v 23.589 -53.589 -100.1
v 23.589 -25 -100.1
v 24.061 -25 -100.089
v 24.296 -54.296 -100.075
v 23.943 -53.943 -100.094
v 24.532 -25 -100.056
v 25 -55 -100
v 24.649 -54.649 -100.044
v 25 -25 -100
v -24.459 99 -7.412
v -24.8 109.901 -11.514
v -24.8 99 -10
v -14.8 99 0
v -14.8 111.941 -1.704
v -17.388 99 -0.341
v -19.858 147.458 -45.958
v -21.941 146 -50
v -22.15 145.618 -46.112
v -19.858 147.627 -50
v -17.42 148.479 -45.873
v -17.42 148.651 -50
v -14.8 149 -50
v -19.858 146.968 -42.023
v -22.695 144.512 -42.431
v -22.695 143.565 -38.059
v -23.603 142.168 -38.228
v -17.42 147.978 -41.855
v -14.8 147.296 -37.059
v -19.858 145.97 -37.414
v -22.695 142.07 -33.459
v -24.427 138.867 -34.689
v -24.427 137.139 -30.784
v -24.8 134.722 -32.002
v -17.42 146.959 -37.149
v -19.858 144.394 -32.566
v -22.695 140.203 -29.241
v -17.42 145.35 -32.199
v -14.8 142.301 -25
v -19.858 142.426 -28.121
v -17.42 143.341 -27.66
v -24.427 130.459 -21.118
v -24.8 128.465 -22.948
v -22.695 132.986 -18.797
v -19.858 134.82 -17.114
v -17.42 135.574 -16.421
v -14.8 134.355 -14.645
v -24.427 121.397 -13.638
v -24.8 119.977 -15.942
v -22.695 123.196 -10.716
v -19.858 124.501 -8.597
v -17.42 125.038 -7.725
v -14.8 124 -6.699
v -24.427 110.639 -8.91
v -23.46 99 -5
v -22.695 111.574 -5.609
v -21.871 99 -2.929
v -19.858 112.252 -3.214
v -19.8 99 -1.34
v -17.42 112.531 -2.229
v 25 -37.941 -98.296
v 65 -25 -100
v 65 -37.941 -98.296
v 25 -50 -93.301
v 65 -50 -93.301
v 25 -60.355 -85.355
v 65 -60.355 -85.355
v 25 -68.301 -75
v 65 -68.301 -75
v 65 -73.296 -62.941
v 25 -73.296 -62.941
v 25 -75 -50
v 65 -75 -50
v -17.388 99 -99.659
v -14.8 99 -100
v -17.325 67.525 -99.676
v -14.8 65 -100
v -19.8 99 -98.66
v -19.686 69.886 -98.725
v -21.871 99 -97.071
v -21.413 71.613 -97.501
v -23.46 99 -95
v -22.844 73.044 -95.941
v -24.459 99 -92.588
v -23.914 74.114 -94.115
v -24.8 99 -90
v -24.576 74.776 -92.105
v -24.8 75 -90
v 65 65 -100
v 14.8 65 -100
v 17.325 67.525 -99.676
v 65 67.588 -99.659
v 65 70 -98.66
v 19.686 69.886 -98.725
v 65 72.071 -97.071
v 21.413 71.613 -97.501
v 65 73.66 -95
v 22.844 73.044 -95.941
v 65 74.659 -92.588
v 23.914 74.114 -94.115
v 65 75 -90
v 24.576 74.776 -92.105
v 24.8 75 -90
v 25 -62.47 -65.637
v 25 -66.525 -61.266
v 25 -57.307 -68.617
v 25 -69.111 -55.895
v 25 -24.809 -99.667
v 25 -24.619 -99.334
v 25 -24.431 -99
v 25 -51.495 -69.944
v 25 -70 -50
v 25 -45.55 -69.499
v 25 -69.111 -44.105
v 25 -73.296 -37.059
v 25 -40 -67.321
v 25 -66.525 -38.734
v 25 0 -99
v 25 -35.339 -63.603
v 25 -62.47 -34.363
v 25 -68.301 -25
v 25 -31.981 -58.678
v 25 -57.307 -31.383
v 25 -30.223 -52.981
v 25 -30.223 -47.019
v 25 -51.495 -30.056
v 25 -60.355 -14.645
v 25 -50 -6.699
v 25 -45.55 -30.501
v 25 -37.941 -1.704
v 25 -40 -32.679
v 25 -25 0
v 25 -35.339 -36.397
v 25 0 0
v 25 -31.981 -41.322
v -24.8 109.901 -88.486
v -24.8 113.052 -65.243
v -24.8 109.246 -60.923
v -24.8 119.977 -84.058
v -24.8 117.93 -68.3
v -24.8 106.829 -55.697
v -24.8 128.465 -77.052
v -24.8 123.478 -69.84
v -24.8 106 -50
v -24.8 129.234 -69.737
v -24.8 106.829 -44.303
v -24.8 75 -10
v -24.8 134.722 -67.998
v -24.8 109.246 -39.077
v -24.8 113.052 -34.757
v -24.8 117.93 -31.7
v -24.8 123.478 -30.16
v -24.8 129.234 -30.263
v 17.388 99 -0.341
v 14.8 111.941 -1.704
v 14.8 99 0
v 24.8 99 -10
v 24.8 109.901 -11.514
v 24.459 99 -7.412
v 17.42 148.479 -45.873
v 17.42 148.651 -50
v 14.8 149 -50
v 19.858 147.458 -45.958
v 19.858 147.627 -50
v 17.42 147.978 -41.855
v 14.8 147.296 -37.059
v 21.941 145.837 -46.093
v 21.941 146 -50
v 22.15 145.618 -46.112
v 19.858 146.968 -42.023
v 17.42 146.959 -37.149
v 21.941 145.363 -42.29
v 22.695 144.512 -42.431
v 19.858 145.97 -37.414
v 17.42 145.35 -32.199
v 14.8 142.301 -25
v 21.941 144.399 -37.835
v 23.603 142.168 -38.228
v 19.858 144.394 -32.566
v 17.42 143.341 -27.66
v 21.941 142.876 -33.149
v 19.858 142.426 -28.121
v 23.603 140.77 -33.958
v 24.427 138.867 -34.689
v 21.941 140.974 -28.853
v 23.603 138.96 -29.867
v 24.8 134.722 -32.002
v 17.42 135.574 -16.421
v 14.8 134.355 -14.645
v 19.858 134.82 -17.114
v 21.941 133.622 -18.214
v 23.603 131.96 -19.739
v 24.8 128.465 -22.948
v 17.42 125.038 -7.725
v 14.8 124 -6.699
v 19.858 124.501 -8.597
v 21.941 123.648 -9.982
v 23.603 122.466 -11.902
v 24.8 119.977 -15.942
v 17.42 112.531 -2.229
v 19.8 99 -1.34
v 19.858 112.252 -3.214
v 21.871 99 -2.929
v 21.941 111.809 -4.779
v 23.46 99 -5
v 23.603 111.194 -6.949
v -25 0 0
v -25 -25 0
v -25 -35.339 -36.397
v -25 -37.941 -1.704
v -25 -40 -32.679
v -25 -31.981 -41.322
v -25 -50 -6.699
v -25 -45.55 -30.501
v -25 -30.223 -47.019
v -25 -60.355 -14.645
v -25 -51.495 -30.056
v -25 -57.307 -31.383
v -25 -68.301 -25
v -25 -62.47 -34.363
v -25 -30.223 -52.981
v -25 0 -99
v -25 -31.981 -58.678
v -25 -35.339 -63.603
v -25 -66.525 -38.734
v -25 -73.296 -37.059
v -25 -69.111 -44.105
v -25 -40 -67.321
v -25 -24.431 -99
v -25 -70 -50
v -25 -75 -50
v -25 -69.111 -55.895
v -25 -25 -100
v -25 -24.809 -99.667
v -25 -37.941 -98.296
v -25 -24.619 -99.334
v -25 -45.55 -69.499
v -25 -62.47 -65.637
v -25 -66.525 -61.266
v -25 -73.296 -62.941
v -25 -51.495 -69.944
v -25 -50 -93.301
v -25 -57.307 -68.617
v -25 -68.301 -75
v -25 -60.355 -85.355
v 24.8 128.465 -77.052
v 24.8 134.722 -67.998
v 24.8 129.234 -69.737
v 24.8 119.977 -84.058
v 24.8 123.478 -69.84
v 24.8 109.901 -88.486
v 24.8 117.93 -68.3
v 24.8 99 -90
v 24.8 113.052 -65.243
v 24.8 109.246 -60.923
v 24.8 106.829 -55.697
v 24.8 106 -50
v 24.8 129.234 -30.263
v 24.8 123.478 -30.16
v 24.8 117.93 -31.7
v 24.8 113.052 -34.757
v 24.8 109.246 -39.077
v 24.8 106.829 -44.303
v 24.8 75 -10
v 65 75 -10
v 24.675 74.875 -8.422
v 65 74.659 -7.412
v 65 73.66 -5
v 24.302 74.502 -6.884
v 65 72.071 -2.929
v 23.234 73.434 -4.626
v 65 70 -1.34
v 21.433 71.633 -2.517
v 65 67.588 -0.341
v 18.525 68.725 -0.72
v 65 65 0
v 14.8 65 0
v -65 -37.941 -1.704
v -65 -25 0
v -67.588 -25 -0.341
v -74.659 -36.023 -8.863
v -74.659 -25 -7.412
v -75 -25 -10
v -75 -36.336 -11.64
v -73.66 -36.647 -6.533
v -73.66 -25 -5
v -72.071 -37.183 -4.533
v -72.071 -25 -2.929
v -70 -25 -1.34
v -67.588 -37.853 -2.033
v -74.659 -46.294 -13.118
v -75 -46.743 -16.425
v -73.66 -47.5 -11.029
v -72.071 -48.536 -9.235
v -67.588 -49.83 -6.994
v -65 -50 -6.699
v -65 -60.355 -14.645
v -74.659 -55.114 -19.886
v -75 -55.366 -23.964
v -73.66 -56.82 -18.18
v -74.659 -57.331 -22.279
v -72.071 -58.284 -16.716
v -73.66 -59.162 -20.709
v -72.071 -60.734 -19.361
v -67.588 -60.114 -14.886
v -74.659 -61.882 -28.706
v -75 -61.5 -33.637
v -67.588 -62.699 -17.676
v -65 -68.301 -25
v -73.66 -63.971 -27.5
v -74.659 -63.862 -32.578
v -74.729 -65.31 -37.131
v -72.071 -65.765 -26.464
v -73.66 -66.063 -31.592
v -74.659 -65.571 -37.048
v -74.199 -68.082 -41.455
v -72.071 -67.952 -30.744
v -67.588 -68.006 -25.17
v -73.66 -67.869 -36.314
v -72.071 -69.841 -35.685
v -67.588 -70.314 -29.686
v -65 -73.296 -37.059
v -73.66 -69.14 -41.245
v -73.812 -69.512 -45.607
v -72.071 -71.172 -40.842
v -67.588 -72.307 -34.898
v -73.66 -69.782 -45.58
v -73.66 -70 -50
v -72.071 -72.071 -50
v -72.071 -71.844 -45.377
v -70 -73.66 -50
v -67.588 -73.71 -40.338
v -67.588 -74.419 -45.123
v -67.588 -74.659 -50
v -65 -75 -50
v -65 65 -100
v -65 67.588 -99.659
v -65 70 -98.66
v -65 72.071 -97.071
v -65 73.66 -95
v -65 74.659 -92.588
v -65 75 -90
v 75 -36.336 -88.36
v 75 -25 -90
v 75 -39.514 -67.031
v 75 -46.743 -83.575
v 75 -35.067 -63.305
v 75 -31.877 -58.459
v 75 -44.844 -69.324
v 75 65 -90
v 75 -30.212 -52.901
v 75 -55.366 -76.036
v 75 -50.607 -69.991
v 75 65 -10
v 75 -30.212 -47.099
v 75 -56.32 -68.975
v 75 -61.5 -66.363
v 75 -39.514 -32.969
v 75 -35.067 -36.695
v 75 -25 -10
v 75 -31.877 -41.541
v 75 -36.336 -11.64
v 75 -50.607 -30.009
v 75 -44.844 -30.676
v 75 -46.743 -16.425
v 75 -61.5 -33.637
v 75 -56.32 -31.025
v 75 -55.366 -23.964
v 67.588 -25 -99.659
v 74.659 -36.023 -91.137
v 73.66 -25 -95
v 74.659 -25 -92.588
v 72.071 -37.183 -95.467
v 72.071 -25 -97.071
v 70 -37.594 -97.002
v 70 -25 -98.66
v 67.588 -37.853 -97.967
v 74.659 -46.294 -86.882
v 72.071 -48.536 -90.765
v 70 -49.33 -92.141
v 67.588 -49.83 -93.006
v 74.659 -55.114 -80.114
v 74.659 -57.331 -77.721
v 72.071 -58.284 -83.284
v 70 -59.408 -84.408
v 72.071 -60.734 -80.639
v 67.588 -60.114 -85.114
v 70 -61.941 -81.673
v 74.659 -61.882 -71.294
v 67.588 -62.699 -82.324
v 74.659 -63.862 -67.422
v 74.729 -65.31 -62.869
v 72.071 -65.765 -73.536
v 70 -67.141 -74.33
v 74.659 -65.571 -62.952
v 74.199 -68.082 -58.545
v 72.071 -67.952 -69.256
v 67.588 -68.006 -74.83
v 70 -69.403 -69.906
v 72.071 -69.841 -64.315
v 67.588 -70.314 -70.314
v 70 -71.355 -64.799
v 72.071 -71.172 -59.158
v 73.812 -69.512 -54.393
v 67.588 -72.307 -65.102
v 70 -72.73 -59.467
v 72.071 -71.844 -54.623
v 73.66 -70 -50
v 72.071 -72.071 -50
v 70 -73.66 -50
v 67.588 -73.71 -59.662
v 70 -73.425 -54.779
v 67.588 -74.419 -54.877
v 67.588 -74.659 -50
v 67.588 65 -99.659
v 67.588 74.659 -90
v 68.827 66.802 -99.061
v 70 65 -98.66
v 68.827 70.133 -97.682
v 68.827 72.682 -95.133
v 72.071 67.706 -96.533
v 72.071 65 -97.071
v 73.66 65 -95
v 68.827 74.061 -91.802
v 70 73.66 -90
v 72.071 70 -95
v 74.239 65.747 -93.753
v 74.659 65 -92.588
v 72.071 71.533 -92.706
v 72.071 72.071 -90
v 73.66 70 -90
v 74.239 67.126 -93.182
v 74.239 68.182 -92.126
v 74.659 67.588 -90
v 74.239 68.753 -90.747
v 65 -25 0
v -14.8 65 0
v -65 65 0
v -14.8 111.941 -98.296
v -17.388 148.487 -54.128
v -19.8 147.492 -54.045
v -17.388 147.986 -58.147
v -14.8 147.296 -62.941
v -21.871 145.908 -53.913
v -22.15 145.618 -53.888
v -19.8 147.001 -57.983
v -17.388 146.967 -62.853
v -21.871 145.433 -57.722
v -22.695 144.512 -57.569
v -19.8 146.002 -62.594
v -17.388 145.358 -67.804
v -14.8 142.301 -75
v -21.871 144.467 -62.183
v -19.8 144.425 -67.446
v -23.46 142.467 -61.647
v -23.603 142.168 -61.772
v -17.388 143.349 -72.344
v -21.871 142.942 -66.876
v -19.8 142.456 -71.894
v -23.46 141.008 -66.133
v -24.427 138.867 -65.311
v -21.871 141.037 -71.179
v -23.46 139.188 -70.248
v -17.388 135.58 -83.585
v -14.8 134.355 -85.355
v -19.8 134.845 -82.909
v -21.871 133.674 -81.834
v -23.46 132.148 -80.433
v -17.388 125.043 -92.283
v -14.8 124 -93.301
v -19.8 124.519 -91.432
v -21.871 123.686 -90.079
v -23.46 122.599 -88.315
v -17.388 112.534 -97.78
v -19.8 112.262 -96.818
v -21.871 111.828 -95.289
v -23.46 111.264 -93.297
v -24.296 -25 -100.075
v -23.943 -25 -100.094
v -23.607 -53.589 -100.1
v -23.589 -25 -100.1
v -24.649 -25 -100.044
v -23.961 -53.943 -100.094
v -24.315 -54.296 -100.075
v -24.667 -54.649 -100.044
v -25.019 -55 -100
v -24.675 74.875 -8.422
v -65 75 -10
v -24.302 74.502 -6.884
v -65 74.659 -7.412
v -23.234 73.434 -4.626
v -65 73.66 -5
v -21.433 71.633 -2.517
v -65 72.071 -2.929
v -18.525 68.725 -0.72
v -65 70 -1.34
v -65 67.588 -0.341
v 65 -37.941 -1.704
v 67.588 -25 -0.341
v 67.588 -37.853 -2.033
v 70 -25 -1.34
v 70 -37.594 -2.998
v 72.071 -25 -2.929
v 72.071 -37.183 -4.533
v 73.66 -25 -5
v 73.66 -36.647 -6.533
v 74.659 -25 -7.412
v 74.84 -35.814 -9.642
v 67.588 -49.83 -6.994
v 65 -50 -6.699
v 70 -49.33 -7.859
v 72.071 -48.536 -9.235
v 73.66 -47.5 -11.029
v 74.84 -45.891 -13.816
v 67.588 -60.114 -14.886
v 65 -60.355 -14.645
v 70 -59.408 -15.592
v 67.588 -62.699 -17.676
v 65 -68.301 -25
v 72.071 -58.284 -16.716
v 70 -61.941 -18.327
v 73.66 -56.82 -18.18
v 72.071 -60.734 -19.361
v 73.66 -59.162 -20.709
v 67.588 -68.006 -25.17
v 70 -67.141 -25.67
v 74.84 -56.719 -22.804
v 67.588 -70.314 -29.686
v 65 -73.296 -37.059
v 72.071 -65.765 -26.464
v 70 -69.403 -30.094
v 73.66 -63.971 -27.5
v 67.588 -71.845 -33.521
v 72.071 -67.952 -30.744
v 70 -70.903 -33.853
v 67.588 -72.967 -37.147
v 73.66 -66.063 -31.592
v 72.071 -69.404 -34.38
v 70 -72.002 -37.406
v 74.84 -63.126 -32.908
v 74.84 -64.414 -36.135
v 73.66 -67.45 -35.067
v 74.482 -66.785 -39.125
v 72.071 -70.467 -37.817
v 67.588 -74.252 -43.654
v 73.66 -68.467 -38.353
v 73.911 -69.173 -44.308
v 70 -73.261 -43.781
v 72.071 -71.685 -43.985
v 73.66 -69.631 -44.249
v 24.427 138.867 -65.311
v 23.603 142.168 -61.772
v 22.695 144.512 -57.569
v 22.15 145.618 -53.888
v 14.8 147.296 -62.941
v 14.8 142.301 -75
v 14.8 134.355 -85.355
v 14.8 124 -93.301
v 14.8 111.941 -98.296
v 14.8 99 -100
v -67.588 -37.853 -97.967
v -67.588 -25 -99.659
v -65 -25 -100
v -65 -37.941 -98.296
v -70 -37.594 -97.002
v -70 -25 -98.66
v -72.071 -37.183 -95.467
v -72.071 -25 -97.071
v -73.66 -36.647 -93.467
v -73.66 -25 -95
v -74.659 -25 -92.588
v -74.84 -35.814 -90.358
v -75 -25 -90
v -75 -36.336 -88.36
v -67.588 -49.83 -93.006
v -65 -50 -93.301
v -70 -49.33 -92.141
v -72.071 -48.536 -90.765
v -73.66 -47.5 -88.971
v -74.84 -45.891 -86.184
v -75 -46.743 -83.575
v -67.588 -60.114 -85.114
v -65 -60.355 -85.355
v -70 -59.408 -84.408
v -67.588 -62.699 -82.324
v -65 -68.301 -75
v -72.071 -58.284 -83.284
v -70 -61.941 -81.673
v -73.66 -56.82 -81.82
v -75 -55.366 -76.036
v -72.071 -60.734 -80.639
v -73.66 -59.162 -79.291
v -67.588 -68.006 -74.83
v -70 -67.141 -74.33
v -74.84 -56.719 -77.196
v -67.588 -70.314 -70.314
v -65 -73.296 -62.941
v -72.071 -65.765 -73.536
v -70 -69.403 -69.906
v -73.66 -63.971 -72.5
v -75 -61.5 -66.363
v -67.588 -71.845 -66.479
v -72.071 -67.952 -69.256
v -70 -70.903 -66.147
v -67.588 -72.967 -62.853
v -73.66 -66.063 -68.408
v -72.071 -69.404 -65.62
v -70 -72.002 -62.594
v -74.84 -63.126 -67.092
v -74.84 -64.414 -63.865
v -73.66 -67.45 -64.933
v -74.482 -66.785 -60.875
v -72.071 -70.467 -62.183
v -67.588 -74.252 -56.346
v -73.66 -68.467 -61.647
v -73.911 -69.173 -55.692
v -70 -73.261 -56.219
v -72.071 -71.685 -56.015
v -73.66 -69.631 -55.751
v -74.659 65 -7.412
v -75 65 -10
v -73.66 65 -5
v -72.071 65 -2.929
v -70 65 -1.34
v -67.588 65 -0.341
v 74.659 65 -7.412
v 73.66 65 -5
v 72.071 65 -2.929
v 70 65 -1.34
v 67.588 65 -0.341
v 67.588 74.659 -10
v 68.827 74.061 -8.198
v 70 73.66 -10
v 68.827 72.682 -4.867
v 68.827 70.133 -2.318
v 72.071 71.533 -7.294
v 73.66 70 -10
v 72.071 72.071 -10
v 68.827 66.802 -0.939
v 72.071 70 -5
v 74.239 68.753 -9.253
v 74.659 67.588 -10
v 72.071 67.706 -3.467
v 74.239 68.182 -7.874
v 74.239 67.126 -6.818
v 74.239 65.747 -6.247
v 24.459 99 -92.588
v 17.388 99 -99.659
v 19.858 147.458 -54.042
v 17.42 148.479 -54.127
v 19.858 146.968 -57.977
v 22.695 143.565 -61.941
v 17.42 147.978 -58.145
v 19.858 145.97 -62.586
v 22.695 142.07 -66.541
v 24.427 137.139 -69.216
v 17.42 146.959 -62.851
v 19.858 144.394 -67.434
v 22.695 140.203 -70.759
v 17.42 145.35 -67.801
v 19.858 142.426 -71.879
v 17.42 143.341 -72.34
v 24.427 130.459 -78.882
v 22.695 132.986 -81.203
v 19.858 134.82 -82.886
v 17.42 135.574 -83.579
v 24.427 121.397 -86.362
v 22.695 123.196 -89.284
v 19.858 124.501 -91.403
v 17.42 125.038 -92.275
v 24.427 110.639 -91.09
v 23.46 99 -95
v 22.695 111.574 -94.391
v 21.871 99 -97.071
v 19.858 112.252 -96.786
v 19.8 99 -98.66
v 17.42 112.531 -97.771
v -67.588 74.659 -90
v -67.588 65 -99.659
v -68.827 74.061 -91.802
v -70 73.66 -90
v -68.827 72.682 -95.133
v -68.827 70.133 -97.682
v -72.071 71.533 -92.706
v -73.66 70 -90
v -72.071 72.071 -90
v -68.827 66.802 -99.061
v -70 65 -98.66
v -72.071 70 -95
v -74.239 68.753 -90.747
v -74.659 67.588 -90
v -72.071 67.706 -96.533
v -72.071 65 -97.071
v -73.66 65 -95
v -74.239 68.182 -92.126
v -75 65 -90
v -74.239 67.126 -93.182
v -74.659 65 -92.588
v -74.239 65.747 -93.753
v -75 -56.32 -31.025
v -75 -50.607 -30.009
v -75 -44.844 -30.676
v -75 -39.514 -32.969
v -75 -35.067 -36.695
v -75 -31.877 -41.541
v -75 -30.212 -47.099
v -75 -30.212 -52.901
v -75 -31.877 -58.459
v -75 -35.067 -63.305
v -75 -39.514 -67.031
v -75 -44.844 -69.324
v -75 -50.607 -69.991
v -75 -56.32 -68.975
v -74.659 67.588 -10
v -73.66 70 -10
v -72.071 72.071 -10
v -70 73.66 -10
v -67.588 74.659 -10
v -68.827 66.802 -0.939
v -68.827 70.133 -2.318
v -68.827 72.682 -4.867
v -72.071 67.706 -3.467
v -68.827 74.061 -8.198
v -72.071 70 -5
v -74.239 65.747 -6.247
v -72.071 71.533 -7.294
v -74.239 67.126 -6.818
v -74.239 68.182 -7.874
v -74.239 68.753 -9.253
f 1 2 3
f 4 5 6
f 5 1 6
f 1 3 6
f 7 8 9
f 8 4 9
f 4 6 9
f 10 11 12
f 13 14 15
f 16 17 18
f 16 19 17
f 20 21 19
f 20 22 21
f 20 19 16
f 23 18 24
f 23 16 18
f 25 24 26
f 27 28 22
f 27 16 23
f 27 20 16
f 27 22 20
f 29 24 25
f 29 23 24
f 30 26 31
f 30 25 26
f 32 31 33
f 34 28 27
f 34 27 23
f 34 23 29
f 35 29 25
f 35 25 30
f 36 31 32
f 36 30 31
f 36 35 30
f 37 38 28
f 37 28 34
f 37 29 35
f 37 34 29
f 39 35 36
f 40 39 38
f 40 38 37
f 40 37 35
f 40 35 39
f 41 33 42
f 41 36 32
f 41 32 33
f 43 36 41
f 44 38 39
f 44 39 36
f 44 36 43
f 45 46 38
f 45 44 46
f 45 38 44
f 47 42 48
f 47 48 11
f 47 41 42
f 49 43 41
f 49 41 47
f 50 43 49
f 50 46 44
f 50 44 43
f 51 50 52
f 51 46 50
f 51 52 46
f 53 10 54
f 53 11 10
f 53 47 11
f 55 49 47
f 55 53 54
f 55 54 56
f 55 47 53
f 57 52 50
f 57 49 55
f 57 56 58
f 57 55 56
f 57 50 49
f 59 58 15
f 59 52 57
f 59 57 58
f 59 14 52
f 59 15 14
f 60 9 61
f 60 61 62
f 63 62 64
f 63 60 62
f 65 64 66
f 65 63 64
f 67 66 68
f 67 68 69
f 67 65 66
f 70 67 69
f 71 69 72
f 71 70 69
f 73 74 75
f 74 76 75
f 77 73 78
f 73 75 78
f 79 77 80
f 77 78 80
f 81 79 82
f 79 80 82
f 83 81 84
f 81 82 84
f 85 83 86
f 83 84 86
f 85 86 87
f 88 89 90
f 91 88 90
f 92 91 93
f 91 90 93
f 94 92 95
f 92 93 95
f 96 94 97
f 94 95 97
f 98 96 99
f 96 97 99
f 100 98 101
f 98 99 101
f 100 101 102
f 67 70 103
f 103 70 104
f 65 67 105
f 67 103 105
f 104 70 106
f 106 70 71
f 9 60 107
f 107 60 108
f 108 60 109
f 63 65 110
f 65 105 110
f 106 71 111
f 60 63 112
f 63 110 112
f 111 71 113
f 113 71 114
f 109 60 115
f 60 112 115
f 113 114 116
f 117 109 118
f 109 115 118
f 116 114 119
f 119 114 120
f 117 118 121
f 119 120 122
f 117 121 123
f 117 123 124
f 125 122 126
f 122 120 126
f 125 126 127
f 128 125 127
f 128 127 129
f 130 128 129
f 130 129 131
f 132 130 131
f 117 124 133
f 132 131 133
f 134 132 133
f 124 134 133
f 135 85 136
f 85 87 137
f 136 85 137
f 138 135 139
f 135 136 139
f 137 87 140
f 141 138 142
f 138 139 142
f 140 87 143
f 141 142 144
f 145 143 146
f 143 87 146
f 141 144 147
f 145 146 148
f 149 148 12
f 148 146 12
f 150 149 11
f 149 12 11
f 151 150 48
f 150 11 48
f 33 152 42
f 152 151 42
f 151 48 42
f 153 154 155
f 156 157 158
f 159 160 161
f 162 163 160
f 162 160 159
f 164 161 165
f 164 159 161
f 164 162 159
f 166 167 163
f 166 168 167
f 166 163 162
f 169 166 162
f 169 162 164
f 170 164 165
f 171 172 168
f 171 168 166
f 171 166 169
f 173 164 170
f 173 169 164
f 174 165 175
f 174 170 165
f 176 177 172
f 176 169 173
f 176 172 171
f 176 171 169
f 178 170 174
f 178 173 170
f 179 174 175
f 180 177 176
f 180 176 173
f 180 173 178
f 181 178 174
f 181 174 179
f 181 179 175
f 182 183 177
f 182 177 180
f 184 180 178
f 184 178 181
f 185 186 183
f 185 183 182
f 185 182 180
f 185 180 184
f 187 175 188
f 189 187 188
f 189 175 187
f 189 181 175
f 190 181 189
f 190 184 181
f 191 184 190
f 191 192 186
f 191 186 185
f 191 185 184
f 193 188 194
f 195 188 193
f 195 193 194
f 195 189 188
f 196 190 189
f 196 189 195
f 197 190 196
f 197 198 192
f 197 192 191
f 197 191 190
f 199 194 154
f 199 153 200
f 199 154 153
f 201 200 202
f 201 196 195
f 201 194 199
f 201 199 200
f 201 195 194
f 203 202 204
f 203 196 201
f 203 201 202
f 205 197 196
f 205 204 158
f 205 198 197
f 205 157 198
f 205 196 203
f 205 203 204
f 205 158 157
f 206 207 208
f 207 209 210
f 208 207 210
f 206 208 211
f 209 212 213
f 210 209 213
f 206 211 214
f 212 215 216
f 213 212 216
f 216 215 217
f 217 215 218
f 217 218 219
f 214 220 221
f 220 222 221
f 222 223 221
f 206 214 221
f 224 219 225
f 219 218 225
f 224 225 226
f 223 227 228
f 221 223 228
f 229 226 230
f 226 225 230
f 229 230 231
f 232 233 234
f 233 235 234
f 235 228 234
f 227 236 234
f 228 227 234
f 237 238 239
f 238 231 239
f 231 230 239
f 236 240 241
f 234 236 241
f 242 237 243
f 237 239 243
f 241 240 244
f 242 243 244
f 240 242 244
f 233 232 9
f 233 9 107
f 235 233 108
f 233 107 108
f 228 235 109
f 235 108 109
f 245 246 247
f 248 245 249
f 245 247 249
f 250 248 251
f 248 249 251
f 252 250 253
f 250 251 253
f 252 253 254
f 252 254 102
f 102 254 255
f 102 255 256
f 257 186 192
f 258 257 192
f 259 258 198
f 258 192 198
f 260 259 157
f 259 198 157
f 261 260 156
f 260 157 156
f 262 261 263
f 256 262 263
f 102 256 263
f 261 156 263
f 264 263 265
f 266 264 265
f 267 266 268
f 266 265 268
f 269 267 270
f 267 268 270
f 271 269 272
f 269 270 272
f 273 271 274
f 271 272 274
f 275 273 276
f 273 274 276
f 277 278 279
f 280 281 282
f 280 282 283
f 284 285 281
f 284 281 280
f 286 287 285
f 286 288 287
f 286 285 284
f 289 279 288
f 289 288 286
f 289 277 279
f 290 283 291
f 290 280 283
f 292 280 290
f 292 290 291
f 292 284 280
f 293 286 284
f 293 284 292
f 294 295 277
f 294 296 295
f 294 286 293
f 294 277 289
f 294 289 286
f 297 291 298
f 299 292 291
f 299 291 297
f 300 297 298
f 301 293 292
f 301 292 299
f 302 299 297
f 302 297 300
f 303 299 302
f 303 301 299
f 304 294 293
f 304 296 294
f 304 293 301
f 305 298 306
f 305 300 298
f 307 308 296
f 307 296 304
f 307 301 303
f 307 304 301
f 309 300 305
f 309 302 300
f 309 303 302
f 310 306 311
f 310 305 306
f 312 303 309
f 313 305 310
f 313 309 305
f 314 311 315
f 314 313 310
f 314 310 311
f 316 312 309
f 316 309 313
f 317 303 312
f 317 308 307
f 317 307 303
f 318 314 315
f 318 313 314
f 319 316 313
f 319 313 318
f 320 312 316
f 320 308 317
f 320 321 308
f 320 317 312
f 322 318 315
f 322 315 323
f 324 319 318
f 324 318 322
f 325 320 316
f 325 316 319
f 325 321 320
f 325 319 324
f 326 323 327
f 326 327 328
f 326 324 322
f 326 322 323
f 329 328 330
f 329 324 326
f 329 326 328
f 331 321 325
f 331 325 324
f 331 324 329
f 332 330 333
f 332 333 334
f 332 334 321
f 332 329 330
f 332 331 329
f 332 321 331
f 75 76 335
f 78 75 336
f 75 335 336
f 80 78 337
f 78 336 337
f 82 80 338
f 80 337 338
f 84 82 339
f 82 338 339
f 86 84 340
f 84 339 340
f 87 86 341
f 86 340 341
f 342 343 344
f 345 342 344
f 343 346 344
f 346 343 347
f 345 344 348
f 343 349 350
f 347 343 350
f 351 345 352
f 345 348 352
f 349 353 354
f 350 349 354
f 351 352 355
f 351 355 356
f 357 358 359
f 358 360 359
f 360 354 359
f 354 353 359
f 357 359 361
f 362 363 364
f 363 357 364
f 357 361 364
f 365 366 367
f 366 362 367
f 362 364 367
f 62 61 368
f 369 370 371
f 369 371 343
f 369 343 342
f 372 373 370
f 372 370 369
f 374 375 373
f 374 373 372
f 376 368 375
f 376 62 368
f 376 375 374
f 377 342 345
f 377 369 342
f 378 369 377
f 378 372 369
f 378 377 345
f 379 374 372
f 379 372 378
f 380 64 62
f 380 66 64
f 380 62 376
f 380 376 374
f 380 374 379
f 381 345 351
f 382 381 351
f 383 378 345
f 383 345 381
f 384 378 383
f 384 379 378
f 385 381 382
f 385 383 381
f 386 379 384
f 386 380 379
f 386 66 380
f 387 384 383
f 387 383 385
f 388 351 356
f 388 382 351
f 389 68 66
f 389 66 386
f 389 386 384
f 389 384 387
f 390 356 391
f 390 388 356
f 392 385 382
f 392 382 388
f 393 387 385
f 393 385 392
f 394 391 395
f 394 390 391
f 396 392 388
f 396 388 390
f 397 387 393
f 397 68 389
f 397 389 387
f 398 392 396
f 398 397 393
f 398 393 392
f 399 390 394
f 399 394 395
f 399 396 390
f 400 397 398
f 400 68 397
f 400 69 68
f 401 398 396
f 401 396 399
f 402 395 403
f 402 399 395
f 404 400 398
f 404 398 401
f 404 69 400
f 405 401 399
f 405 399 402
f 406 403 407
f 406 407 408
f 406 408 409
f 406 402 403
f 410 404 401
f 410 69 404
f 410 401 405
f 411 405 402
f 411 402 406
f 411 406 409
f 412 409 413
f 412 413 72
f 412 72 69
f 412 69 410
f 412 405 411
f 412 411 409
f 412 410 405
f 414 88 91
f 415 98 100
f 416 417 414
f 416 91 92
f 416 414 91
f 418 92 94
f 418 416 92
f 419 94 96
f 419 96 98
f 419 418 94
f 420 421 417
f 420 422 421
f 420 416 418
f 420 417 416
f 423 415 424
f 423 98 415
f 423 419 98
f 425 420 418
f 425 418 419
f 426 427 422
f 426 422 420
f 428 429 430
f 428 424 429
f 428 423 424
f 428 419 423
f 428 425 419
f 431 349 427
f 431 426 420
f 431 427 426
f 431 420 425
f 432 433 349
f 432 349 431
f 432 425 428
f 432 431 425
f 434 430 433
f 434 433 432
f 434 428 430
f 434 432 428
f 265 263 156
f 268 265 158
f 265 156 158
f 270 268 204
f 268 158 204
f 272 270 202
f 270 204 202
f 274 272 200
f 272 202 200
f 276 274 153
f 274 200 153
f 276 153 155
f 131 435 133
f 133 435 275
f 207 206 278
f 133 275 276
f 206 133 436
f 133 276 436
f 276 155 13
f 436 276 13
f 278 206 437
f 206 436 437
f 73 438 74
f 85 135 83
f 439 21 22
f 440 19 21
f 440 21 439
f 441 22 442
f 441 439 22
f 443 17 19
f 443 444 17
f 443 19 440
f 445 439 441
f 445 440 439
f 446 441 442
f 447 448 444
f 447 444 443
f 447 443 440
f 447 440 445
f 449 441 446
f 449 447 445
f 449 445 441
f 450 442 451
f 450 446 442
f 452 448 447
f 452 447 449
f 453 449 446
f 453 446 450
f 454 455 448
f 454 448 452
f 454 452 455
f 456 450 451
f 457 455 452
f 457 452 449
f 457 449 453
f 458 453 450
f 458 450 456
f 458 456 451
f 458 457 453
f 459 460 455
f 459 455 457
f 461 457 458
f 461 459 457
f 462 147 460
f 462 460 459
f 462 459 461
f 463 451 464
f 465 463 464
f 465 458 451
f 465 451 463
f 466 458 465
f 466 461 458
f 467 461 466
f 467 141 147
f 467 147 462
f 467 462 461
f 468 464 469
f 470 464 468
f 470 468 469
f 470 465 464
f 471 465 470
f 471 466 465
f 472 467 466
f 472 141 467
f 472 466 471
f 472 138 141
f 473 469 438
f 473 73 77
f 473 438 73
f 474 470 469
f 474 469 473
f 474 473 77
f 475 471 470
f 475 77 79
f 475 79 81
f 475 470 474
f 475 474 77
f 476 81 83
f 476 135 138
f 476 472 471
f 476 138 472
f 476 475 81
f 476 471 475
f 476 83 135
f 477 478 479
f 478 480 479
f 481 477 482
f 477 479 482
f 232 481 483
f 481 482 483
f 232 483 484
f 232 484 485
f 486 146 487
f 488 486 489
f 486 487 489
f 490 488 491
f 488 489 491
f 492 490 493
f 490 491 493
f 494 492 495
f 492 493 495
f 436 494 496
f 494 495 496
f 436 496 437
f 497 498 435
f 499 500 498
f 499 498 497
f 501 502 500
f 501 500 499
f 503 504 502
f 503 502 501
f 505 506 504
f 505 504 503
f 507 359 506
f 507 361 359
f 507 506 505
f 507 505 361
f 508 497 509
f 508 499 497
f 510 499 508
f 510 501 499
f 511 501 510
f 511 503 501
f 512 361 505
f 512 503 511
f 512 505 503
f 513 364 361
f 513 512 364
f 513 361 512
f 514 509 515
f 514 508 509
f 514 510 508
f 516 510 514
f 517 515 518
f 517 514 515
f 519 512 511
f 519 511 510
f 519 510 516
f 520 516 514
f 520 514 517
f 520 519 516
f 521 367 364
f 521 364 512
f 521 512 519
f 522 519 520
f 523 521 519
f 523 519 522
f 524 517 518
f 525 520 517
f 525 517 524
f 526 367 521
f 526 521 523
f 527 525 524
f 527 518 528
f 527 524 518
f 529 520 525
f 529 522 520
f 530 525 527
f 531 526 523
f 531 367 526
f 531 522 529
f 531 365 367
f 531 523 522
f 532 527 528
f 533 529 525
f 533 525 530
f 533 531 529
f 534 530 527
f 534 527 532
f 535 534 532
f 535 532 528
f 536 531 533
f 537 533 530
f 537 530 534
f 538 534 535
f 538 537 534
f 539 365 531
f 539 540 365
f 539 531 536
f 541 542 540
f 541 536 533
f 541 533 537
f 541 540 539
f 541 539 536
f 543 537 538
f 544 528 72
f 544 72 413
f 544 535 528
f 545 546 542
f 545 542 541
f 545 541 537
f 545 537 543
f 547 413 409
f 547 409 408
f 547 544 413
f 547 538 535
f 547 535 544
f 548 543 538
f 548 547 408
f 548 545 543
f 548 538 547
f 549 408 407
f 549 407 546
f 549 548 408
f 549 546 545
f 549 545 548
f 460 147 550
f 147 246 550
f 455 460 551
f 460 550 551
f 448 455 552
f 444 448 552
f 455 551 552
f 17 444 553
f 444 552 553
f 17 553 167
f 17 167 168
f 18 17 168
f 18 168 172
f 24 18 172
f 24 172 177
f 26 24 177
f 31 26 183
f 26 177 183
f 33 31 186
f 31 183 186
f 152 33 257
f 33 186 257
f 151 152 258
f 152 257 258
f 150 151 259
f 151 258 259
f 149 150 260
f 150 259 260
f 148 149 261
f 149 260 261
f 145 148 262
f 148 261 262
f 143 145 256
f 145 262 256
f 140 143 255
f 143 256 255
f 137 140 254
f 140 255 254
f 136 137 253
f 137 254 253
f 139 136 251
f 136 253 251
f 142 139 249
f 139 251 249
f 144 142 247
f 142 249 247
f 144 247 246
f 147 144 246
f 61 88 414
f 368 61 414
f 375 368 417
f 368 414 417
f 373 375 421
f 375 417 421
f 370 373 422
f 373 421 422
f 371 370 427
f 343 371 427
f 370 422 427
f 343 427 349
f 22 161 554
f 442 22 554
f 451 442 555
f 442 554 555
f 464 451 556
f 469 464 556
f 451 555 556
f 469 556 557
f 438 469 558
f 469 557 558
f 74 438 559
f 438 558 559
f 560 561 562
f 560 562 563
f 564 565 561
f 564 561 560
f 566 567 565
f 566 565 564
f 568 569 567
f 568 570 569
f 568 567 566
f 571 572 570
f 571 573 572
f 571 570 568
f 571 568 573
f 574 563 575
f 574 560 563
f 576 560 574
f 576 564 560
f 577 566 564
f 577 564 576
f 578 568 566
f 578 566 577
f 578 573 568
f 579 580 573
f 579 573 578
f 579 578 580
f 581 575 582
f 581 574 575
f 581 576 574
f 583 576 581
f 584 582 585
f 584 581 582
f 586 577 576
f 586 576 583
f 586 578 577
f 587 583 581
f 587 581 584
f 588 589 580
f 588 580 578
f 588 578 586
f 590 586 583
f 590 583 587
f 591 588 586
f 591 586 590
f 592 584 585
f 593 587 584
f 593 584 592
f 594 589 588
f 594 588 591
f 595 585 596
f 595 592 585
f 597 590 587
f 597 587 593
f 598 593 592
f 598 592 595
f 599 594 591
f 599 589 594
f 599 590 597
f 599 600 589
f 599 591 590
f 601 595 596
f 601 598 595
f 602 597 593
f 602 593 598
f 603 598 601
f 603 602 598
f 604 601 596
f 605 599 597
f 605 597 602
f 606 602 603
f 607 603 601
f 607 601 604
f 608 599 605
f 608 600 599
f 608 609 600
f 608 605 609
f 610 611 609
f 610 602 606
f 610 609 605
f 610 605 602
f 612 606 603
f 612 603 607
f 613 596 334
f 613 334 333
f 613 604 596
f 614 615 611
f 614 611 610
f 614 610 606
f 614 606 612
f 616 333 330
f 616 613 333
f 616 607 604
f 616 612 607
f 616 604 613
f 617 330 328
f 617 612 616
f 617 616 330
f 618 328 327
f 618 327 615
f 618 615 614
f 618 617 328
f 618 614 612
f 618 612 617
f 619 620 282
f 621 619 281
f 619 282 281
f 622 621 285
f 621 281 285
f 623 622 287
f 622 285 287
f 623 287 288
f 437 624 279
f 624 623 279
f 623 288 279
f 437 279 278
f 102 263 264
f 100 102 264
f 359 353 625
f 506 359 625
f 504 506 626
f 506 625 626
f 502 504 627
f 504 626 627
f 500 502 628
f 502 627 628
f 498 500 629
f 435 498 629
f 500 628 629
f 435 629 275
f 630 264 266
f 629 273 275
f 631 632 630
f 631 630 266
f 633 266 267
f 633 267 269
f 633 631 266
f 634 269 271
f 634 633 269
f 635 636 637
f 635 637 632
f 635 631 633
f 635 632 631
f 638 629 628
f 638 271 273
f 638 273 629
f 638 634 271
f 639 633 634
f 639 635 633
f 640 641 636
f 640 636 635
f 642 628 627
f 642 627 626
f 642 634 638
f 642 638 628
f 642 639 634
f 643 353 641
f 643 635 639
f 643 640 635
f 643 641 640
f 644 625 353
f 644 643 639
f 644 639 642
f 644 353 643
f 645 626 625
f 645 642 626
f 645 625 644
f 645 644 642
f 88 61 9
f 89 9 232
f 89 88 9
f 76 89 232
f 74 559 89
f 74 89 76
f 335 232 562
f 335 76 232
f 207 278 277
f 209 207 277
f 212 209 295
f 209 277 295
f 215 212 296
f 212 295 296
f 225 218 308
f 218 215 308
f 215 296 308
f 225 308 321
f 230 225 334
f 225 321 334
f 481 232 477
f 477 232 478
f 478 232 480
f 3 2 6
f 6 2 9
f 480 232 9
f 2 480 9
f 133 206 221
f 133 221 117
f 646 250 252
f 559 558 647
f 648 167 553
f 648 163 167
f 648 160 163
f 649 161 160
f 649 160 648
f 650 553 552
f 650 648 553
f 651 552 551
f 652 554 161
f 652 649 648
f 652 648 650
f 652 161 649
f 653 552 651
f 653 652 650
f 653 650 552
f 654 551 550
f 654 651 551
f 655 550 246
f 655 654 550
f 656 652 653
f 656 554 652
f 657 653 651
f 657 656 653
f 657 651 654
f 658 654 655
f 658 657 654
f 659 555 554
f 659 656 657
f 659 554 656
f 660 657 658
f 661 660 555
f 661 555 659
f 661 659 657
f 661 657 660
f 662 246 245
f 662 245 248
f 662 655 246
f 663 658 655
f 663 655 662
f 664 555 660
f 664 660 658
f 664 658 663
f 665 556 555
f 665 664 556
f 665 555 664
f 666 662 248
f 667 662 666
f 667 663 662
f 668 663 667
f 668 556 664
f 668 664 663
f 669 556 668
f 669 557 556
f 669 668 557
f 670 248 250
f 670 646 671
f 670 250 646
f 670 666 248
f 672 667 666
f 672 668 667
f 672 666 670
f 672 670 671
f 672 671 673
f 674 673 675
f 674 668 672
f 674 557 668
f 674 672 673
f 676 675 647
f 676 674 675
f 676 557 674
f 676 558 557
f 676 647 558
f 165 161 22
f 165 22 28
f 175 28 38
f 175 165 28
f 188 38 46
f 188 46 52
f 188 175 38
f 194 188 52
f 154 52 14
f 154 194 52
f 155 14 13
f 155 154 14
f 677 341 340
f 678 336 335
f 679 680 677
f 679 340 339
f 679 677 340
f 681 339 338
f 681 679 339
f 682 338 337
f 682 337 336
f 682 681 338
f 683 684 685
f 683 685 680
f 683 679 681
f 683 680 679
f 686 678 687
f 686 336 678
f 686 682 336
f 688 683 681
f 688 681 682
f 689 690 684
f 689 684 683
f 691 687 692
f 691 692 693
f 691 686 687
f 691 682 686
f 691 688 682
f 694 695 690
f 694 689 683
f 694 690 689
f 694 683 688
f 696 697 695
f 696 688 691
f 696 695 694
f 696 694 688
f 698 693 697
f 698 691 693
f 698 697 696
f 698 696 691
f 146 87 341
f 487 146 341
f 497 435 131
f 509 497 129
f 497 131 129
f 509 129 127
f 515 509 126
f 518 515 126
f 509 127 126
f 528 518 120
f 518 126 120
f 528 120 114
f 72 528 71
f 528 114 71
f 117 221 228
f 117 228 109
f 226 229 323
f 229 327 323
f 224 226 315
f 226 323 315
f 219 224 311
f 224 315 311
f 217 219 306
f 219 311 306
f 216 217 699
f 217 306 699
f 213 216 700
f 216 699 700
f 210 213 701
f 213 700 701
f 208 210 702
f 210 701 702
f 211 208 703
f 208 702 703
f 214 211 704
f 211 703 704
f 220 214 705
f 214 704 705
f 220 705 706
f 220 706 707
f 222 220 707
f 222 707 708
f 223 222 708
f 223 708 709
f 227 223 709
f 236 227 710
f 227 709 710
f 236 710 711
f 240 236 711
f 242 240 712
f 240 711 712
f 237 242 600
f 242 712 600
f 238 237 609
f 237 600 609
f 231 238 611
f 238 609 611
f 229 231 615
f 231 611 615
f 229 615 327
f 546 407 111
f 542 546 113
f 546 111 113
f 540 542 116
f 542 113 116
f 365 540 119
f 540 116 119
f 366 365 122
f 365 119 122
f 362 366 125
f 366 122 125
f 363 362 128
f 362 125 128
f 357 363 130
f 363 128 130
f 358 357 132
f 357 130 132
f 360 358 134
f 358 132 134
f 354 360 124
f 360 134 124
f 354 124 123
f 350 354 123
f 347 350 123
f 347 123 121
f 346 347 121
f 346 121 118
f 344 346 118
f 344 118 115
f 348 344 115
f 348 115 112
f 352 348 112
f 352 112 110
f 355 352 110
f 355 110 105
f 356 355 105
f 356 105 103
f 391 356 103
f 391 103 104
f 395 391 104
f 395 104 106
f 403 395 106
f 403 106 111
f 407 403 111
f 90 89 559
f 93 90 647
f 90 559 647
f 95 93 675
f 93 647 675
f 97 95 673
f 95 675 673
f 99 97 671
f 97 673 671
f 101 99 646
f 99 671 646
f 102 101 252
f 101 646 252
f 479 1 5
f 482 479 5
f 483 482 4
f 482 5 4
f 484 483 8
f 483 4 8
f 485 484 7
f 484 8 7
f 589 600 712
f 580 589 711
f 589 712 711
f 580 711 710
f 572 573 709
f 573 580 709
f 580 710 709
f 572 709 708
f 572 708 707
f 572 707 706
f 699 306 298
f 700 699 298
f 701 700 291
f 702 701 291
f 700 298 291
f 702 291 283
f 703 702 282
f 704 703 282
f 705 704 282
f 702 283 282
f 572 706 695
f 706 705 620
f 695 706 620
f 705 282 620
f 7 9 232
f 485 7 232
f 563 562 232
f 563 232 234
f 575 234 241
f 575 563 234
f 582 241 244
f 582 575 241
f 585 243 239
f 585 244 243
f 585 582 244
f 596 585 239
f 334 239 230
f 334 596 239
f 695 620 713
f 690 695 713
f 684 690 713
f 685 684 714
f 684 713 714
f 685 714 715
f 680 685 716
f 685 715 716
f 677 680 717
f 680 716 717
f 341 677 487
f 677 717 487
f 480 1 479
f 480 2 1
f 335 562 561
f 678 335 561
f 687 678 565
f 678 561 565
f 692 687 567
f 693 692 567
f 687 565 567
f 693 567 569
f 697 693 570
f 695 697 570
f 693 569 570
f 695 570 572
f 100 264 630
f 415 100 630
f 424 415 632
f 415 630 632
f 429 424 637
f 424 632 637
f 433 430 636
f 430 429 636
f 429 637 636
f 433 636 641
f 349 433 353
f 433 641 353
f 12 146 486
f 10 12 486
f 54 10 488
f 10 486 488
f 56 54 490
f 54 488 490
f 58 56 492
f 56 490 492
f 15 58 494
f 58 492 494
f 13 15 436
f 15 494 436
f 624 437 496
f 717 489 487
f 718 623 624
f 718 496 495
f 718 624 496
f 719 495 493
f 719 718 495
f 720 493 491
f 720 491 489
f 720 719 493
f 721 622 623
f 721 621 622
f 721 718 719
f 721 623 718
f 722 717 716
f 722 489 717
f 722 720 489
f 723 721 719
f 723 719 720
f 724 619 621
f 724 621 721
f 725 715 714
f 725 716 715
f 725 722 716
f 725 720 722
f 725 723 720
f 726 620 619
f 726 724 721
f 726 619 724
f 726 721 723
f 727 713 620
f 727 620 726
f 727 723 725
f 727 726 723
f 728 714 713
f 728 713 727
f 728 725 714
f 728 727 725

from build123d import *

# Parameters (mm, degrees)
BOSS_EXTRUDE1_DEPTH    = 100
SKETCH2_W              = 50
SKETCH2_H              = 50
CUT_EXTRUDE1_DEPTH     = 195.489074243
FILLET1_R              = 50
CUT_EXTRUDE2_DEPTH     = 25
SKETCH7_R              = 20
CUT_EXTRUDE3_DEPTH     = 234.882449106
FILLET2_R              = 50
CUT_EXTRUDE6_START     = -75
CUT_EXTRUDE6_OUTLINE_W = 50
CUT_EXTRUDE6_OUTLINE_H = 6.698729811
CUT_EXTRUDE6_DEPTH     = 50
CUT_EXTRUDE7_DEPTH     = 25
FILLET3_R              = 10
SKETCH11_W             = 50
SKETCH11_H             = 25
CUT_EXTRUDE8_DEPTH     = 99
BOSS_EXTRUDE7_DEPTH    = 0.1
FILLET4_R              = 10
FILLET5_R              = 10
SKETCH14_R             = 20
CUT_EXTRUDE9_DEPTH     = 206.380257205


with BuildPart() as part:
    # Sketch1 → Boss-Extrude1 (new body)
    with BuildSketch(Plane.XY):
        Polygon((-24.8, 75), (-24.8, 149), (24.8, 149), (24.8, 75), (75, 75), (75, -75), (-75, -75), (-75, 75), align=None)
    extrude(amount=-BOSS_EXTRUDE1_DEPTH)

    # Sketch2 → Cut-Extrude1 (cut, through all)
    with BuildSketch(Plane.XY):
        with Locations((0, -75)):
            Rectangle(SKETCH2_W, SKETCH2_H)
    extrude(amount=-CUT_EXTRUDE1_DEPTH, mode=Mode.SUBTRACT)

    # Fillet1
    fillet1_edges = [part.edges().sort_by_distance(p)[0] for p in [
        (0, 149, -100),
        (0, 149, 0),
    ]]
    fillet(fillet1_edges, radius=FILLET1_R - 0.0001)  # a hair under: the kernel refuses the full size

    # Sketch6 → Cut-Extrude2 (cut, symmetric)
    with BuildSketch(Plane(origin=(0, 0, 0), x_dir=(0, 0, -1), z_dir=(1, 0, 0))):
        with BuildLine():
            Line((100, -50), (0, -50))
            ThreePointArc((0, -50), (50, 0), (100, -50))
        make_face()
    extrude(amount=CUT_EXTRUDE2_DEPTH, both=True, mode=Mode.SUBTRACT)

    # Sketch7 → Cut-Extrude3 (cut, through all)
    with BuildSketch(Plane.ZY.offset(75)):
        with Locations(Location((-50, -50, 0), (0, 0, 270))):
            Circle(SKETCH7_R)
    extrude(amount=-CUT_EXTRUDE3_DEPTH, mode=Mode.SUBTRACT)

    # Fillet2
    fillet2_edges = [part.edges().sort_by_distance(p)[0] for p in [
        (-50, -75, -100),
        (-50, -75, 0),
    ]]
    fillet(fillet2_edges, radius=FILLET2_R - 0.0001)  # a hair under: the kernel refuses the full size

    # Cut-Extrude6: read off the stored shape, not the designer's step
    # Cut-Extrude6 outline → Cut-Extrude6 (cut)
    with BuildSketch(Plane(origin=(0, 0, 0), x_dir=(1, 0, 0), z_dir=(0, 1, 0)).offset(CUT_EXTRUDE6_START)):
        with Locations((0, 96.650635095)):
            Rectangle(CUT_EXTRUDE6_OUTLINE_W, CUT_EXTRUDE6_OUTLINE_H)
        with Locations((0, 3.349364906)):
            Rectangle(CUT_EXTRUDE6_OUTLINE_W, CUT_EXTRUDE6_OUTLINE_H)
    extrude(amount=CUT_EXTRUDE6_DEPTH, mode=Mode.SUBTRACT)

    # Sketch10 → Cut-Extrude7 (cut, symmetric)
    with BuildSketch(Plane(origin=(0, 0, 0), x_dir=(0, 0, -1), z_dir=(1, 0, 0))):
        with BuildLine():
            Line((0, -25), (100, -25))
            ThreePointArc((100, -25), (50, -11.611517322), (0, -25))
        make_face()
    extrude(amount=CUT_EXTRUDE7_DEPTH, both=True, mode=Mode.SUBTRACT)

    # Fillet3
    # the kernel refuses this fillet: 10 mm, written as the material it takes off along each edge
    with BuildSketch(Plane(origin=(24.8, 99.0001, -100), x_dir=(0, 0, 1), z_dir=(0, -1, 0)), Plane(origin=(-24.8, 75, 0), x_dir=(1, 0, 0), z_dir=(0, 1, 0)), Plane(origin=(-24.8, 75, -100), x_dir=(0, 0, 1), z_dir=(0, 1, 0)), Plane(origin=(24.8, 99.0001, 0), x_dir=(-1, 0, 0), z_dir=(0, -1, 0))) as fillet3_piece_1:
        with BuildLine():
            CenterArc((FILLET3_R, FILLET3_R), FILLET3_R, 180, 90)
            Line((0, FILLET3_R), (0, 0))
            Line((0, 0), (FILLET3_R, 0))
        make_face()
    extrude(amount=24.0001, mode=Mode.SUBTRACT)
    with BuildSketch(Plane(origin=(24.8, 75, 0), x_dir=(0, -1, 0), z_dir=(1, 0, 0)), Plane(origin=(-100, 75, -100), x_dir=(0, 0, 1), z_dir=(1, 0, 0)), Plane(origin=(24.8, 75, -100), x_dir=(0, 0, 1), z_dir=(1, 0, 0)), Plane(origin=(-100, 75, 0), x_dir=(0, -1, 0), z_dir=(1, 0, 0))) as fillet3_piece_2:
        with BuildLine():
            CenterArc((FILLET3_R, FILLET3_R), FILLET3_R, 180, 90)
            Line((0, FILLET3_R), (0, 0))
            Line((0, 0), (FILLET3_R, 0))
        make_face()
    extrude(amount=75.2, mode=Mode.SUBTRACT)
    with BuildSketch(Plane(origin=(-75, -25.0001, -100), x_dir=(0, 0, 1), z_dir=(0, 1, 0)), Plane(origin=(75, 100, 0), x_dir=(-1, 0, 0), z_dir=(0, -1, 0)), Plane(origin=(75, 100, -100), x_dir=(0, 0, 1), z_dir=(0, -1, 0)), Plane(origin=(-75, -25.0001, 0), x_dir=(1, 0, 0), z_dir=(0, 1, 0))) as fillet3_piece_3:
        with BuildLine():
            CenterArc((FILLET3_R, FILLET3_R), FILLET3_R, 180, 90)
            Line((0, FILLET3_R), (0, 0))
            Line((0, 0), (FILLET3_R, 0))
        make_face()
    extrude(amount=125.0001, mode=Mode.SUBTRACT)
    with BuildSketch(Plane(origin=(-24.8, 99.0001, -49.9999), x_dir=(0, 1, 0), z_dir=(0, 0, -1))) as fillet3_piece_4:
        with BuildLine():
            CenterArc((49.9999 - FILLET3_R, FILLET3_R), FILLET3_R, 270, 90)
            Line((49.9999 - FILLET3_R, 0), (49.9999, 0))
            Line((49.9999, 0), (49.9999, FILLET3_R))
        make_face()
    revolve(axis=Axis((-24.8, 99.0001, -49.9999), (1, 0, 0)), revolution_arc=90, mode=Mode.SUBTRACT)
    with BuildSketch(Plane(origin=(-24.8, 99.0001, -50.0001), x_dir=(0, 1, 0), z_dir=(0, 0, 1))) as fillet3_piece_5:
        with BuildLine():
            CenterArc((49.9999 - FILLET3_R, -FILLET3_R), FILLET3_R, 0, 90)
            Line((49.9999, -FILLET3_R), (49.9999, 0))
            Line((49.9999, 0), (49.9999 - FILLET3_R, 0))
        make_face()
    revolve(axis=Axis((-24.8, 99.0001, -50.0001), (-1, 0, 0)), revolution_arc=90, mode=Mode.SUBTRACT)
    with BuildSketch(Plane(origin=(24.8, 99.0001, -49.9999), x_dir=(0, 1, 0), z_dir=(0, 0, -1))) as fillet3_piece_6:
        with BuildLine():
            CenterArc((49.9999 - FILLET3_R, -FILLET3_R), FILLET3_R, 0, 90)
            Line((49.9999, -FILLET3_R), (49.9999, 0))
            Line((49.9999, 0), (49.9999 - FILLET3_R, 0))
        make_face()
    revolve(axis=Axis((24.8, 99.0001, -49.9999), (1, 0, 0)), revolution_arc=90, mode=Mode.SUBTRACT)
    with BuildSketch(Plane(origin=(24.8, 99.0001, -50.0001), x_dir=(0, 1, 0), z_dir=(0, 0, 1))) as fillet3_piece_7:
        with BuildLine():
            CenterArc((49.9999 - FILLET3_R, FILLET3_R), FILLET3_R, 270, 90)
            Line((49.9999, FILLET3_R), (49.9999, 0))
            Line((49.9999, 0), (49.9999 - FILLET3_R, 0))
        make_face()
    revolve(axis=Axis((24.8, 99.0001, -50.0001), (-1, 0, 0)), revolution_arc=90, mode=Mode.SUBTRACT)
    with BuildSketch(Plane(origin=(75, -25.0001, -49.9999), x_dir=(0, 0, 1), z_dir=(0, 1, 0))) as fillet3_piece_8:
        with BuildLine():
            CenterArc((49.9999 - FILLET3_R, -FILLET3_R), FILLET3_R, 0, 90)
            Line((49.9999, -FILLET3_R), (49.9999, 0))
            Line((49.9999, 0), (49.9999 - FILLET3_R, 0))
        make_face()
    revolve(axis=Axis((75, -25.0001, -49.9999), (1, 0, 0)), revolution_arc=90, mode=Mode.SUBTRACT)
    with BuildSketch(Plane(origin=(75, -25.0001, -50.0001), x_dir=(0, 0, -1), z_dir=(0, 1, 0))) as fillet3_piece_9:
        with BuildLine():
            CenterArc((49.9999 - FILLET3_R, FILLET3_R), FILLET3_R, 270, 90)
            Line((49.9999, FILLET3_R), (49.9999, 0))
            Line((49.9999, 0), (49.9999 - FILLET3_R, 0))
        make_face()
    revolve(axis=Axis((75, -25.0001, -50.0001), (-1, 0, 0)), revolution_arc=90, mode=Mode.SUBTRACT)
    with BuildSketch(Plane(origin=(-75, -25.0001, -49.9999), x_dir=(0, 0, 1), z_dir=(0, 1, 0))) as fillet3_piece_10:
        with BuildLine():
            CenterArc((49.9999 - FILLET3_R, FILLET3_R), FILLET3_R, 270, 90)
            Line((49.9999, FILLET3_R), (49.9999, 0))
            Line((49.9999, 0), (49.9999 - FILLET3_R, 0))
        make_face()
    revolve(axis=Axis((-75, -25.0001, -49.9999), (1, 0, 0)), revolution_arc=90, mode=Mode.SUBTRACT)
    with BuildSketch(Plane(origin=(-75, -25.0001, -50.0001), x_dir=(0, 0, -1), z_dir=(0, 1, 0))) as fillet3_piece_11:
        with BuildLine():
            CenterArc((49.9999 - FILLET3_R, -FILLET3_R), FILLET3_R, 0, 90)
            Line((49.9999, -FILLET3_R), (49.9999, 0))
            Line((49.9999, 0), (49.9999 - FILLET3_R, 0))
        make_face()
    revolve(axis=Axis((-75, -25.0001, -50.0001), (-1, 0, 0)), revolution_arc=90, mode=Mode.SUBTRACT)
    with BuildSketch(Plane(origin=(-75, -75, -49.9999), x_dir=(0, 1, 0), z_dir=(0, 0, -1)), Plane(origin=(24.8, 149, -49.9999), x_dir=(0, -1, 0), z_dir=(0, 0, -1))) as fillet3_piece_12:
        with BuildLine():
            CenterArc((FILLET3_R, FILLET3_R), FILLET3_R, 180, 90)
            Line((0, FILLET3_R), (0, 0))
            Line((0, 0), (FILLET3_R, 0))
        make_face()
    extrude(amount=0.0002, mode=Mode.SUBTRACT)
    with BuildSketch(Plane(origin=(75, -75, -49.9999), x_dir=(0, 1, 0), z_dir=(0, 0, -1)), Plane(origin=(-24.8, 149, -49.9999), x_dir=(0, -1, 0), z_dir=(0, 0, -1))) as fillet3_piece_13:
        with BuildLine():
            CenterArc((FILLET3_R, -FILLET3_R), FILLET3_R, 90, 90)
            Line((0, -FILLET3_R), (0, 0))
            Line((0, 0), (FILLET3_R, 0))
        make_face()
    extrude(amount=0.0002, mode=Mode.SUBTRACT)
    with BuildSketch(Plane(origin=(-0.2, 75, -100), x_dir=(0, 0, 1), z_dir=(1, 0, 0))) as fillet3_piece_14a_section:
        with BuildLine():
            CenterArc((FILLET3_R, FILLET3_R), FILLET3_R, 180, 90)
            Line((0, FILLET3_R), (0, 0))
            Line((0, 0), (FILLET3_R, 0))
        make_face()
    fillet3_piece_14a = extrude(amount=100.2, mode=Mode.PRIVATE)
    fillet3_piece_14a = split(fillet3_piece_14a, bisect_by=Plane(origin=(24.8, 75, -100), z_dir=(-1, 0, 0)), keep=Keep.TOP, mode=Mode.PRIVATE)
    with BuildSketch(Plane(origin=(24.8, 99.0001, -100), x_dir=(0, 0, 1), z_dir=(0, -1, 0))) as fillet3_piece_14b_section:
        with BuildLine():
            CenterArc((FILLET3_R, FILLET3_R), FILLET3_R, 180, 90)
            Line((0, FILLET3_R), (0, 0))
            Line((0, 0), (FILLET3_R, 0))
        make_face()
    fillet3_piece_14b = extrude(amount=49.0001, mode=Mode.PRIVATE)
    fillet3_piece_14b = split(fillet3_piece_14b, bisect_by=Plane(origin=(24.8, 75, -100), z_dir=(0, -1, 0)), keep=Keep.TOP, mode=Mode.PRIVATE)
    fillet3_piece_14 = fillet3_piece_14a & fillet3_piece_14b
    add(fillet3_piece_14, mode=Mode.SUBTRACT)
    with BuildSketch(Plane(origin=(-0.2, 75, 0), x_dir=(0, -1, 0), z_dir=(1, 0, 0))) as fillet3_piece_15a_section:
        with BuildLine():
            CenterArc((FILLET3_R, FILLET3_R), FILLET3_R, 180, 90)
            Line((0, FILLET3_R), (0, 0))
            Line((0, 0), (FILLET3_R, 0))
        make_face()
    fillet3_piece_15a = extrude(amount=100.2, mode=Mode.PRIVATE)
    fillet3_piece_15a = split(fillet3_piece_15a, bisect_by=Plane(origin=(24.8, 75, 0), z_dir=(-1, 0, 0)), keep=Keep.TOP, mode=Mode.PRIVATE)
    with BuildSketch(Plane(origin=(24.8, 99.0001, 0), x_dir=(-1, 0, 0), z_dir=(0, -1, 0))) as fillet3_piece_15b_section:
        with BuildLine():
            CenterArc((FILLET3_R, FILLET3_R), FILLET3_R, 180, 90)
            Line((0, FILLET3_R), (0, 0))
            Line((0, 0), (FILLET3_R, 0))
        make_face()
    fillet3_piece_15b = extrude(amount=49.0001, mode=Mode.PRIVATE)
    fillet3_piece_15b = split(fillet3_piece_15b, bisect_by=Plane(origin=(24.8, 75, 0), z_dir=(0, -1, 0)), keep=Keep.TOP, mode=Mode.PRIVATE)
    fillet3_piece_15 = fillet3_piece_15a & fillet3_piece_15b
    add(fillet3_piece_15, mode=Mode.SUBTRACT)
    with BuildSketch(Plane(origin=(-24.8, 50, -100), x_dir=(0, 0, 1), z_dir=(0, 1, 0))) as fillet3_piece_16a_section:
        with BuildLine():
            CenterArc((FILLET3_R, FILLET3_R), FILLET3_R, 180, 90)
            Line((0, FILLET3_R), (0, 0))
            Line((0, 0), (FILLET3_R, 0))
        make_face()
    fillet3_piece_16a = extrude(amount=49.0001, mode=Mode.PRIVATE)
    fillet3_piece_16a = split(fillet3_piece_16a, bisect_by=Plane(origin=(-24.8, 75, -100), z_dir=(0, -1, 0)), keep=Keep.TOP, mode=Mode.PRIVATE)
    with BuildSketch(Plane(origin=(-100, 75, -100), x_dir=(0, 0, 1), z_dir=(1, 0, 0))) as fillet3_piece_16b_section:
        with BuildLine():
            CenterArc((FILLET3_R, FILLET3_R), FILLET3_R, 180, 90)
            Line((0, FILLET3_R), (0, 0))
            Line((0, 0), (FILLET3_R, 0))
        make_face()
    fillet3_piece_16b = extrude(amount=100.2, mode=Mode.PRIVATE)
    fillet3_piece_16b = split(fillet3_piece_16b, bisect_by=Plane(origin=(-24.8, 75, -100), z_dir=(1, 0, 0)), keep=Keep.TOP, mode=Mode.PRIVATE)
    fillet3_piece_16 = fillet3_piece_16a & fillet3_piece_16b
    add(fillet3_piece_16, mode=Mode.SUBTRACT)
    with BuildSketch(Plane(origin=(-24.8, 50, 0), x_dir=(1, 0, 0), z_dir=(0, 1, 0))) as fillet3_piece_17a_section:
        with BuildLine():
            CenterArc((FILLET3_R, FILLET3_R), FILLET3_R, 180, 90)
            Line((0, FILLET3_R), (0, 0))
            Line((0, 0), (FILLET3_R, 0))
        make_face()
    fillet3_piece_17a = extrude(amount=49.0001, mode=Mode.PRIVATE)
    fillet3_piece_17a = split(fillet3_piece_17a, bisect_by=Plane(origin=(-24.8, 75, 0), z_dir=(0, -1, 0)), keep=Keep.TOP, mode=Mode.PRIVATE)
    with BuildSketch(Plane(origin=(-100, 75, 0), x_dir=(0, -1, 0), z_dir=(1, 0, 0))) as fillet3_piece_17b_section:
        with BuildLine():
            CenterArc((FILLET3_R, FILLET3_R), FILLET3_R, 180, 90)
            Line((0, FILLET3_R), (0, 0))
            Line((0, 0), (FILLET3_R, 0))
        make_face()
    fillet3_piece_17b = extrude(amount=100.2, mode=Mode.PRIVATE)
    fillet3_piece_17b = split(fillet3_piece_17b, bisect_by=Plane(origin=(-24.8, 75, 0), z_dir=(1, 0, 0)), keep=Keep.TOP, mode=Mode.PRIVATE)
    fillet3_piece_17 = fillet3_piece_17a & fillet3_piece_17b
    add(fillet3_piece_17, mode=Mode.SUBTRACT)

    # Sketch11 → Cut-Extrude8 (cut)
    with BuildSketch(Plane.XY):
        with Locations((0, -12.5)):
            Rectangle(SKETCH11_W, SKETCH11_H)
    extrude(amount=-CUT_EXTRUDE8_DEPTH, mode=Mode.SUBTRACT)

    # Fillet5
    # the kernel refuses this fillet: 10 mm, written as the material it takes off along each edge
    with BuildSketch(Plane(origin=(65, 65, -10), x_dir=(0, 1, 0), z_dir=(1, 0, 0))) as fillet5_piece_1_section:
        Polygon((0, 0), (FILLET5_R, 0), (FILLET5_R, FILLET5_R), (0, FILLET5_R), align=None)
    fillet5_piece_1 = extrude(amount=FILLET5_R, mode=Mode.PRIVATE)
    fillet5_piece_1 = fillet5_piece_1 - Plane(origin=(65, 65, -10), x_dir=(0, -0.7071067811865475, -0.7071067811865475), z_dir=(1, 0, 0)) * Sphere(FILLET5_R, mode=Mode.PRIVATE)
    add(fillet5_piece_1, mode=Mode.SUBTRACT)
    with BuildSketch(Plane(origin=(65, 65, -90), x_dir=(0, 1, 0), z_dir=(1, 0, 0))) as fillet5_piece_2_section:
        Polygon((0, 0), (FILLET5_R, 0), (FILLET5_R, -FILLET5_R), (0, -FILLET5_R), align=None)
    fillet5_piece_2 = extrude(amount=FILLET5_R, mode=Mode.PRIVATE)
    fillet5_piece_2 = fillet5_piece_2 - Plane(origin=(65, 65, -90), x_dir=(0, -0.7071067811865475, 0.7071067811865475), z_dir=(1, 0, 0)) * Sphere(FILLET5_R, mode=Mode.PRIVATE)
    add(fillet5_piece_2, mode=Mode.SUBTRACT)
    with BuildSketch(Plane(origin=(-65, 65, -90), x_dir=(0, 1, 0), z_dir=(-1, 0, 0))) as fillet5_piece_3_section:
        Polygon((0, 0), (FILLET5_R, 0), (FILLET5_R, FILLET5_R), (0, FILLET5_R), align=None)
    fillet5_piece_3 = extrude(amount=FILLET5_R, mode=Mode.PRIVATE)
    fillet5_piece_3 = fillet5_piece_3 - Plane(origin=(-65, 65, -90), x_dir=(0, -0.7071067811865475, 0.7071067811865475), z_dir=(-1, 0, 0)) * Sphere(FILLET5_R, mode=Mode.PRIVATE)
    add(fillet5_piece_3, mode=Mode.SUBTRACT)
    with BuildSketch(Plane(origin=(-65, 65, -10), x_dir=(0, 1, 0), z_dir=(-1, 0, 0))) as fillet5_piece_4_section:
        Polygon((0, 0), (FILLET5_R, 0), (FILLET5_R, -FILLET5_R), (0, -FILLET5_R), align=None)
    fillet5_piece_4 = extrude(amount=FILLET5_R, mode=Mode.PRIVATE)
    fillet5_piece_4 = fillet5_piece_4 - Plane(origin=(-65, 65, -10), x_dir=(0, -0.7071067811865475, -0.7071067811865475), z_dir=(-1, 0, 0)) * Sphere(FILLET5_R, mode=Mode.PRIVATE)
    add(fillet5_piece_4, mode=Mode.SUBTRACT)
    with BuildSketch(Plane(origin=(75, 75, -10), x_dir=(0, -1, 0), z_dir=(0, 0, -1))) as fillet5_piece_5:
        with BuildLine():
            CenterArc((FILLET5_R, FILLET5_R), FILLET5_R, 180, 90)
            Line((0, FILLET5_R), (0, 0))
            Line((0, 0), (FILLET5_R, 0))
        make_face()
    extrude(amount=80, mode=Mode.SUBTRACT)
    with BuildSketch(Plane(origin=(-75, 75, -10), x_dir=(0, -1, 0), z_dir=(0, 0, -1))) as fillet5_piece_6:
        with BuildLine():
            CenterArc((FILLET5_R, -FILLET5_R), FILLET5_R, 90, 90)
            Line((0, -FILLET5_R), (0, 0))
            Line((0, 0), (FILLET5_R, 0))
        make_face()
    extrude(amount=80, mode=Mode.SUBTRACT)

    # Sketch14 → Cut-Extrude9 (cut, through all)
    with BuildSketch(Plane(origin=(24.8, 0, 0), x_dir=(0, 0, -1), z_dir=(1, 0, 0))):
        with Locations(Location((50, 126, 0), (0, 0, 25.856016698))):
            Circle(SKETCH14_R)
    extrude(amount=-CUT_EXTRUDE9_DEPTH, mode=Mode.SUBTRACT)


with BuildPart() as body_2:
    # Sketch13 → Boss-Extrude7 (new body)
    with BuildSketch(Plane(origin=(0, 0, -100), x_dir=(-1, 0, 0), z_dir=(0, 0, -1))):
        Polygon((-25, -25), (-25, -55), (25.018802851, -55), (25, -25), align=None)
    extrude(amount=BOSS_EXTRUDE7_DEPTH)

    # Fillet4
    # the kernel refuses this fillet: 10 mm, written as the material it takes off along each edge
    with BuildSketch(Plane(origin=(-25.021013242, -58.526683302, -100.1), x_dir=(0, 0, 1), z_dir=(0.0006267615930632001, 0.9999998035849335, 0))) as fillet4_piece_1:
        with BuildLine():
            CenterArc((10, 1.410673598), FILLET4_R, 180, 8.109614456)
            Line((0, 1.410673598), (0, 0))
            Line((0, 0), (0.1, 0))
        make_face()
    extrude(amount=37.053373882, mode=Mode.SUBTRACT)
    with BuildSketch(Plane(origin=(25, -21.473316005, -100.1), x_dir=(0, 0, 1), z_dir=(0, -1, 0))) as fillet4_piece_2:
        with BuildLine():
            CenterArc((10, 1.410673598), FILLET4_R, 180, 8.109614456)
            Line((0, 1.410673598), (0, 0))
            Line((0, 0), (0.1, 0))
        make_face()
    extrude(amount=37.05336799, mode=Mode.SUBTRACT)
    with BuildSketch(Plane(origin=(28.526683995, -55, -100.1), x_dir=(0, 0, 1), z_dir=(-1, 0, 0))) as fillet4_piece_3:
        with BuildLine():
            CenterArc((10, 1.410673598), FILLET4_R, 180, 8.109614456)
            Line((0, 1.410673598), (0, 0))
            Line((0, 0), (0.1, 0))
        make_face()
    extrude(amount=57.072170841, mode=Mode.SUBTRACT)


solid = Compound([part.part, body_2.part])
